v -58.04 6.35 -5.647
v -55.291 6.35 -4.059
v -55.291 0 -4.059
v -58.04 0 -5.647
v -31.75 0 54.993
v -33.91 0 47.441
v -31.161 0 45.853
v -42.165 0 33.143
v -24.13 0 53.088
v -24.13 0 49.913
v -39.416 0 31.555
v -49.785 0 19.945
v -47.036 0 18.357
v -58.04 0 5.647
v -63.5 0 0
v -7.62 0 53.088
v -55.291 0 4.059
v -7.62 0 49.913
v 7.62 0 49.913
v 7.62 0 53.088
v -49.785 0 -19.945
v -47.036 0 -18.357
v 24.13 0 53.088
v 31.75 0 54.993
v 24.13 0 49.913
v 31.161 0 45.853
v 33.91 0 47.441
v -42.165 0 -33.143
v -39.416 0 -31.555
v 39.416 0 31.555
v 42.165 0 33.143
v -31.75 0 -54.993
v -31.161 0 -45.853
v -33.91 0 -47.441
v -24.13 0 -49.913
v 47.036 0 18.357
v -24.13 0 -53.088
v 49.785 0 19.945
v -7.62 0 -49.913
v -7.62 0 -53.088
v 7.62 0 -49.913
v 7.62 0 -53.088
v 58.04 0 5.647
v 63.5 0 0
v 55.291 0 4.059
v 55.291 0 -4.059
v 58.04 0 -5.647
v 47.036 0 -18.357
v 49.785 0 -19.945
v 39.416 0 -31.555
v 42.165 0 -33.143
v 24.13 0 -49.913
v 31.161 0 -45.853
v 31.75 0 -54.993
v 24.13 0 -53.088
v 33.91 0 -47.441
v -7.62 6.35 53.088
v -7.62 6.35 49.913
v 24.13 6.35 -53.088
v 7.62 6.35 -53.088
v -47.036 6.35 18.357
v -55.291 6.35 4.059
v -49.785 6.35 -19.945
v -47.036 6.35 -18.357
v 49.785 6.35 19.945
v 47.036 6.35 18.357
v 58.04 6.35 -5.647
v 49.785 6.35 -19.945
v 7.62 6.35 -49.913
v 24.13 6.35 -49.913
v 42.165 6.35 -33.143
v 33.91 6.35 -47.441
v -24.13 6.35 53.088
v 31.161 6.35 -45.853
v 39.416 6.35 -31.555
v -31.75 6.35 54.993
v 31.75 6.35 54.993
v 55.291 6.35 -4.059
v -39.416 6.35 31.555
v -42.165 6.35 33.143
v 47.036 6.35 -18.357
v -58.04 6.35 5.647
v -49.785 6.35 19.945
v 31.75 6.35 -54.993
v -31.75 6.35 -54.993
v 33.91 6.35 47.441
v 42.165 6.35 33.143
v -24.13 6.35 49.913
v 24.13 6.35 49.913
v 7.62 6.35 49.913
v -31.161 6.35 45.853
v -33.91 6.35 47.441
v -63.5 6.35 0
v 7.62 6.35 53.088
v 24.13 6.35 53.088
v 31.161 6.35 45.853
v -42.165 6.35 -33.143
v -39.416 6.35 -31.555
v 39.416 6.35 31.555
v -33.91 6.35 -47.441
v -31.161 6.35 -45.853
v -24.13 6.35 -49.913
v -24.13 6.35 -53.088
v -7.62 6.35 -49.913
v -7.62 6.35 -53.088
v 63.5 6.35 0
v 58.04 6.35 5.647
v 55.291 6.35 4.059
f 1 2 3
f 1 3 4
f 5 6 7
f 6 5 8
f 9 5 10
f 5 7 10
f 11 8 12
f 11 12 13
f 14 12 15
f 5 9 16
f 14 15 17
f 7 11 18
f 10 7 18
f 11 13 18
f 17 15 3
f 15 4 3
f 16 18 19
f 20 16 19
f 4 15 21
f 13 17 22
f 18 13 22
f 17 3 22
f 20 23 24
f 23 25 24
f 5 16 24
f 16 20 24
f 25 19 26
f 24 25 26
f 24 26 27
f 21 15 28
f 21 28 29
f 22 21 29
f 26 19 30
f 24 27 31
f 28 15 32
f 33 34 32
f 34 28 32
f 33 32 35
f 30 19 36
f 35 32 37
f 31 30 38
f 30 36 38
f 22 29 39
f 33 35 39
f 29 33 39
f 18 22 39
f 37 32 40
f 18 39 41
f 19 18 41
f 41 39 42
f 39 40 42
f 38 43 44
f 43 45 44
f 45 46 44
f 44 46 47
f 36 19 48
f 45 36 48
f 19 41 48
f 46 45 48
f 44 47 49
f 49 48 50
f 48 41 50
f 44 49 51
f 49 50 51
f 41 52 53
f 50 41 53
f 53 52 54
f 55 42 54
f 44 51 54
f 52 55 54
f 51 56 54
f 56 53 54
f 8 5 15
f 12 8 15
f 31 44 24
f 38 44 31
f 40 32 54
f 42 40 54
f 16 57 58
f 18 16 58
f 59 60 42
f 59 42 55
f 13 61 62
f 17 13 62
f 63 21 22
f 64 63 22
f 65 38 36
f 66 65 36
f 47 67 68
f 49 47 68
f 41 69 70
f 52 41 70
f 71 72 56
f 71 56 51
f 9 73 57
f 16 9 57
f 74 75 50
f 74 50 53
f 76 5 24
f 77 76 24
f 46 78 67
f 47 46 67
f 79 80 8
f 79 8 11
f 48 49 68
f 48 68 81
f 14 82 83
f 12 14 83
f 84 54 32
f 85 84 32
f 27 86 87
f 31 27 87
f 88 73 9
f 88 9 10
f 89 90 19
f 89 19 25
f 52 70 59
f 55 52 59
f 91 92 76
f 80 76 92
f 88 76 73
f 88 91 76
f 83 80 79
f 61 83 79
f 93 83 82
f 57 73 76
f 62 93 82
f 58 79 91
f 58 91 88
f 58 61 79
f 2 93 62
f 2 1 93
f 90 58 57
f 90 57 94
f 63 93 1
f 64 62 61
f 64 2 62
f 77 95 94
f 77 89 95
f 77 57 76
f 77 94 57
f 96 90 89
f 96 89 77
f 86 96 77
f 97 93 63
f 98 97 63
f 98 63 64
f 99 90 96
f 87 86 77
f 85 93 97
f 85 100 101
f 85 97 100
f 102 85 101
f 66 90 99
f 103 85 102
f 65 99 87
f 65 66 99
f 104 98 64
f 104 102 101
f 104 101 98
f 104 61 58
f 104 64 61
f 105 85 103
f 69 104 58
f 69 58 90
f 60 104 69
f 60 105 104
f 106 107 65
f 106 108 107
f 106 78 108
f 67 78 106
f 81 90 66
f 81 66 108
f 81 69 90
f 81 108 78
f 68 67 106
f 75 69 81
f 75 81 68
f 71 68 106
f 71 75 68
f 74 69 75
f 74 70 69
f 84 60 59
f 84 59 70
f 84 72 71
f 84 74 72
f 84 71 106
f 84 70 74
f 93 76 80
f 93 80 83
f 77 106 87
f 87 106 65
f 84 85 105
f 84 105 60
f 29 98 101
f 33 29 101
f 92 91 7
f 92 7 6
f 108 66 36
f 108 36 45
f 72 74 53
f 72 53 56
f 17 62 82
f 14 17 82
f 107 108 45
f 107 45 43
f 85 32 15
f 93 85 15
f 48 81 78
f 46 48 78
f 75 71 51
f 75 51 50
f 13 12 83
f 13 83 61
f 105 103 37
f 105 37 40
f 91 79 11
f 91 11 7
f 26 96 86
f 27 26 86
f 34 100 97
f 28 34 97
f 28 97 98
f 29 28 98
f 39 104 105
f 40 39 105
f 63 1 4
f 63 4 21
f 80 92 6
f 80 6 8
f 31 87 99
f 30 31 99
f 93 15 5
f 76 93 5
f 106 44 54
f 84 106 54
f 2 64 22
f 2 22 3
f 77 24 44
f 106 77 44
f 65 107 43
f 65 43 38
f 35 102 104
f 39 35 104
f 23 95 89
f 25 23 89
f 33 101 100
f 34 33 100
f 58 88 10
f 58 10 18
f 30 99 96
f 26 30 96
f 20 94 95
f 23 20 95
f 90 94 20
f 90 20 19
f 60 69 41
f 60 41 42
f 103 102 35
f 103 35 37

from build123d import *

# Parameters (mm, degrees)
BOSS_EXTRUDE1_DEPTH = 6.35
SKETCH2_W           = 16.51
SKETCH2_H           = 3.175
CUT_EXTRUDE1_DEPTH  = 7.35


with BuildPart() as part:
    # Sketch1 → Boss-Extrude1 (new body)
    with BuildSketch(Plane(origin=(0, 0, 0), x_dir=(1, 0, 0), z_dir=(0, 1, 0))):
        Polygon((-63.5, 0), (-31.75, -54.99261314), (31.75, -54.99261314), (63.5, 0), (31.75, 54.99261314), (-31.75, 54.99261314), align=None)
    extrude(amount=BOSS_EXTRUDE1_DEPTH)

    # Sketch2 → Cut-Extrude1 (cut, through all)
    with BuildSketch(Plane(origin=(0, 6.35, 0), x_dir=(1, 0, 0), z_dir=(0, 1, 0))):
        Polygon((-55.290590949, -4.059113577), (-58.040221606, -5.646613577), (-49.785221606, -19.944692993), (-47.035590949, -18.357192993), align=None)
        Polygon((-31.160590949, -45.853499563), (-33.910221606, -47.440999563), (-42.165221606, -33.142920147), (-39.415590949, -31.555420147), align=None)
        Polygon((-31.160590949, 45.853499563), (-33.910221606, 47.440999563), (-42.165221606, 33.142920147), (-39.415590949, 31.555420147), align=None)
        Polygon((-49.785221606, 19.944692993), (-47.035590949, 18.357192993), (-55.290590949, 4.059113577), (-58.040221606, 5.646613577), align=None)
        with Locations((15.875, 51.50011314)):
            Rectangle(SKETCH2_W, SKETCH2_H)
        with Locations((-15.875, 51.50011314)):
            Rectangle(SKETCH2_W, SKETCH2_H)
        Polygon((55.290590949, 4.059113577), (58.040221606, 5.646613577), (49.785221606, 19.944692993), (47.035590949, 18.357192993), align=None)
        Polygon((42.165221606, 33.142920147), (39.415590949, 31.555420147), (31.160590949, 45.853499563), (33.910221606, 47.440999563), align=None)
        Polygon((31.160590949, -45.853499563), (33.910221606, -47.440999563), (42.165221606, -33.142920147), (39.415590949, -31.555420147), align=None)
        Polygon((49.785221606, -19.944692993), (47.035590949, -18.357192993), (55.290590949, -4.059113577), (58.040221606, -5.646613577), align=None)
        with Locations((-15.875, -51.50011314)):
            Rectangle(SKETCH2_W, SKETCH2_H)
        with Locations((15.875, -51.50011314)):
            Rectangle(SKETCH2_W, SKETCH2_H)
    extrude(amount=-CUT_EXTRUDE1_DEPTH, mode=Mode.SUBTRACT)


solid = part.part
